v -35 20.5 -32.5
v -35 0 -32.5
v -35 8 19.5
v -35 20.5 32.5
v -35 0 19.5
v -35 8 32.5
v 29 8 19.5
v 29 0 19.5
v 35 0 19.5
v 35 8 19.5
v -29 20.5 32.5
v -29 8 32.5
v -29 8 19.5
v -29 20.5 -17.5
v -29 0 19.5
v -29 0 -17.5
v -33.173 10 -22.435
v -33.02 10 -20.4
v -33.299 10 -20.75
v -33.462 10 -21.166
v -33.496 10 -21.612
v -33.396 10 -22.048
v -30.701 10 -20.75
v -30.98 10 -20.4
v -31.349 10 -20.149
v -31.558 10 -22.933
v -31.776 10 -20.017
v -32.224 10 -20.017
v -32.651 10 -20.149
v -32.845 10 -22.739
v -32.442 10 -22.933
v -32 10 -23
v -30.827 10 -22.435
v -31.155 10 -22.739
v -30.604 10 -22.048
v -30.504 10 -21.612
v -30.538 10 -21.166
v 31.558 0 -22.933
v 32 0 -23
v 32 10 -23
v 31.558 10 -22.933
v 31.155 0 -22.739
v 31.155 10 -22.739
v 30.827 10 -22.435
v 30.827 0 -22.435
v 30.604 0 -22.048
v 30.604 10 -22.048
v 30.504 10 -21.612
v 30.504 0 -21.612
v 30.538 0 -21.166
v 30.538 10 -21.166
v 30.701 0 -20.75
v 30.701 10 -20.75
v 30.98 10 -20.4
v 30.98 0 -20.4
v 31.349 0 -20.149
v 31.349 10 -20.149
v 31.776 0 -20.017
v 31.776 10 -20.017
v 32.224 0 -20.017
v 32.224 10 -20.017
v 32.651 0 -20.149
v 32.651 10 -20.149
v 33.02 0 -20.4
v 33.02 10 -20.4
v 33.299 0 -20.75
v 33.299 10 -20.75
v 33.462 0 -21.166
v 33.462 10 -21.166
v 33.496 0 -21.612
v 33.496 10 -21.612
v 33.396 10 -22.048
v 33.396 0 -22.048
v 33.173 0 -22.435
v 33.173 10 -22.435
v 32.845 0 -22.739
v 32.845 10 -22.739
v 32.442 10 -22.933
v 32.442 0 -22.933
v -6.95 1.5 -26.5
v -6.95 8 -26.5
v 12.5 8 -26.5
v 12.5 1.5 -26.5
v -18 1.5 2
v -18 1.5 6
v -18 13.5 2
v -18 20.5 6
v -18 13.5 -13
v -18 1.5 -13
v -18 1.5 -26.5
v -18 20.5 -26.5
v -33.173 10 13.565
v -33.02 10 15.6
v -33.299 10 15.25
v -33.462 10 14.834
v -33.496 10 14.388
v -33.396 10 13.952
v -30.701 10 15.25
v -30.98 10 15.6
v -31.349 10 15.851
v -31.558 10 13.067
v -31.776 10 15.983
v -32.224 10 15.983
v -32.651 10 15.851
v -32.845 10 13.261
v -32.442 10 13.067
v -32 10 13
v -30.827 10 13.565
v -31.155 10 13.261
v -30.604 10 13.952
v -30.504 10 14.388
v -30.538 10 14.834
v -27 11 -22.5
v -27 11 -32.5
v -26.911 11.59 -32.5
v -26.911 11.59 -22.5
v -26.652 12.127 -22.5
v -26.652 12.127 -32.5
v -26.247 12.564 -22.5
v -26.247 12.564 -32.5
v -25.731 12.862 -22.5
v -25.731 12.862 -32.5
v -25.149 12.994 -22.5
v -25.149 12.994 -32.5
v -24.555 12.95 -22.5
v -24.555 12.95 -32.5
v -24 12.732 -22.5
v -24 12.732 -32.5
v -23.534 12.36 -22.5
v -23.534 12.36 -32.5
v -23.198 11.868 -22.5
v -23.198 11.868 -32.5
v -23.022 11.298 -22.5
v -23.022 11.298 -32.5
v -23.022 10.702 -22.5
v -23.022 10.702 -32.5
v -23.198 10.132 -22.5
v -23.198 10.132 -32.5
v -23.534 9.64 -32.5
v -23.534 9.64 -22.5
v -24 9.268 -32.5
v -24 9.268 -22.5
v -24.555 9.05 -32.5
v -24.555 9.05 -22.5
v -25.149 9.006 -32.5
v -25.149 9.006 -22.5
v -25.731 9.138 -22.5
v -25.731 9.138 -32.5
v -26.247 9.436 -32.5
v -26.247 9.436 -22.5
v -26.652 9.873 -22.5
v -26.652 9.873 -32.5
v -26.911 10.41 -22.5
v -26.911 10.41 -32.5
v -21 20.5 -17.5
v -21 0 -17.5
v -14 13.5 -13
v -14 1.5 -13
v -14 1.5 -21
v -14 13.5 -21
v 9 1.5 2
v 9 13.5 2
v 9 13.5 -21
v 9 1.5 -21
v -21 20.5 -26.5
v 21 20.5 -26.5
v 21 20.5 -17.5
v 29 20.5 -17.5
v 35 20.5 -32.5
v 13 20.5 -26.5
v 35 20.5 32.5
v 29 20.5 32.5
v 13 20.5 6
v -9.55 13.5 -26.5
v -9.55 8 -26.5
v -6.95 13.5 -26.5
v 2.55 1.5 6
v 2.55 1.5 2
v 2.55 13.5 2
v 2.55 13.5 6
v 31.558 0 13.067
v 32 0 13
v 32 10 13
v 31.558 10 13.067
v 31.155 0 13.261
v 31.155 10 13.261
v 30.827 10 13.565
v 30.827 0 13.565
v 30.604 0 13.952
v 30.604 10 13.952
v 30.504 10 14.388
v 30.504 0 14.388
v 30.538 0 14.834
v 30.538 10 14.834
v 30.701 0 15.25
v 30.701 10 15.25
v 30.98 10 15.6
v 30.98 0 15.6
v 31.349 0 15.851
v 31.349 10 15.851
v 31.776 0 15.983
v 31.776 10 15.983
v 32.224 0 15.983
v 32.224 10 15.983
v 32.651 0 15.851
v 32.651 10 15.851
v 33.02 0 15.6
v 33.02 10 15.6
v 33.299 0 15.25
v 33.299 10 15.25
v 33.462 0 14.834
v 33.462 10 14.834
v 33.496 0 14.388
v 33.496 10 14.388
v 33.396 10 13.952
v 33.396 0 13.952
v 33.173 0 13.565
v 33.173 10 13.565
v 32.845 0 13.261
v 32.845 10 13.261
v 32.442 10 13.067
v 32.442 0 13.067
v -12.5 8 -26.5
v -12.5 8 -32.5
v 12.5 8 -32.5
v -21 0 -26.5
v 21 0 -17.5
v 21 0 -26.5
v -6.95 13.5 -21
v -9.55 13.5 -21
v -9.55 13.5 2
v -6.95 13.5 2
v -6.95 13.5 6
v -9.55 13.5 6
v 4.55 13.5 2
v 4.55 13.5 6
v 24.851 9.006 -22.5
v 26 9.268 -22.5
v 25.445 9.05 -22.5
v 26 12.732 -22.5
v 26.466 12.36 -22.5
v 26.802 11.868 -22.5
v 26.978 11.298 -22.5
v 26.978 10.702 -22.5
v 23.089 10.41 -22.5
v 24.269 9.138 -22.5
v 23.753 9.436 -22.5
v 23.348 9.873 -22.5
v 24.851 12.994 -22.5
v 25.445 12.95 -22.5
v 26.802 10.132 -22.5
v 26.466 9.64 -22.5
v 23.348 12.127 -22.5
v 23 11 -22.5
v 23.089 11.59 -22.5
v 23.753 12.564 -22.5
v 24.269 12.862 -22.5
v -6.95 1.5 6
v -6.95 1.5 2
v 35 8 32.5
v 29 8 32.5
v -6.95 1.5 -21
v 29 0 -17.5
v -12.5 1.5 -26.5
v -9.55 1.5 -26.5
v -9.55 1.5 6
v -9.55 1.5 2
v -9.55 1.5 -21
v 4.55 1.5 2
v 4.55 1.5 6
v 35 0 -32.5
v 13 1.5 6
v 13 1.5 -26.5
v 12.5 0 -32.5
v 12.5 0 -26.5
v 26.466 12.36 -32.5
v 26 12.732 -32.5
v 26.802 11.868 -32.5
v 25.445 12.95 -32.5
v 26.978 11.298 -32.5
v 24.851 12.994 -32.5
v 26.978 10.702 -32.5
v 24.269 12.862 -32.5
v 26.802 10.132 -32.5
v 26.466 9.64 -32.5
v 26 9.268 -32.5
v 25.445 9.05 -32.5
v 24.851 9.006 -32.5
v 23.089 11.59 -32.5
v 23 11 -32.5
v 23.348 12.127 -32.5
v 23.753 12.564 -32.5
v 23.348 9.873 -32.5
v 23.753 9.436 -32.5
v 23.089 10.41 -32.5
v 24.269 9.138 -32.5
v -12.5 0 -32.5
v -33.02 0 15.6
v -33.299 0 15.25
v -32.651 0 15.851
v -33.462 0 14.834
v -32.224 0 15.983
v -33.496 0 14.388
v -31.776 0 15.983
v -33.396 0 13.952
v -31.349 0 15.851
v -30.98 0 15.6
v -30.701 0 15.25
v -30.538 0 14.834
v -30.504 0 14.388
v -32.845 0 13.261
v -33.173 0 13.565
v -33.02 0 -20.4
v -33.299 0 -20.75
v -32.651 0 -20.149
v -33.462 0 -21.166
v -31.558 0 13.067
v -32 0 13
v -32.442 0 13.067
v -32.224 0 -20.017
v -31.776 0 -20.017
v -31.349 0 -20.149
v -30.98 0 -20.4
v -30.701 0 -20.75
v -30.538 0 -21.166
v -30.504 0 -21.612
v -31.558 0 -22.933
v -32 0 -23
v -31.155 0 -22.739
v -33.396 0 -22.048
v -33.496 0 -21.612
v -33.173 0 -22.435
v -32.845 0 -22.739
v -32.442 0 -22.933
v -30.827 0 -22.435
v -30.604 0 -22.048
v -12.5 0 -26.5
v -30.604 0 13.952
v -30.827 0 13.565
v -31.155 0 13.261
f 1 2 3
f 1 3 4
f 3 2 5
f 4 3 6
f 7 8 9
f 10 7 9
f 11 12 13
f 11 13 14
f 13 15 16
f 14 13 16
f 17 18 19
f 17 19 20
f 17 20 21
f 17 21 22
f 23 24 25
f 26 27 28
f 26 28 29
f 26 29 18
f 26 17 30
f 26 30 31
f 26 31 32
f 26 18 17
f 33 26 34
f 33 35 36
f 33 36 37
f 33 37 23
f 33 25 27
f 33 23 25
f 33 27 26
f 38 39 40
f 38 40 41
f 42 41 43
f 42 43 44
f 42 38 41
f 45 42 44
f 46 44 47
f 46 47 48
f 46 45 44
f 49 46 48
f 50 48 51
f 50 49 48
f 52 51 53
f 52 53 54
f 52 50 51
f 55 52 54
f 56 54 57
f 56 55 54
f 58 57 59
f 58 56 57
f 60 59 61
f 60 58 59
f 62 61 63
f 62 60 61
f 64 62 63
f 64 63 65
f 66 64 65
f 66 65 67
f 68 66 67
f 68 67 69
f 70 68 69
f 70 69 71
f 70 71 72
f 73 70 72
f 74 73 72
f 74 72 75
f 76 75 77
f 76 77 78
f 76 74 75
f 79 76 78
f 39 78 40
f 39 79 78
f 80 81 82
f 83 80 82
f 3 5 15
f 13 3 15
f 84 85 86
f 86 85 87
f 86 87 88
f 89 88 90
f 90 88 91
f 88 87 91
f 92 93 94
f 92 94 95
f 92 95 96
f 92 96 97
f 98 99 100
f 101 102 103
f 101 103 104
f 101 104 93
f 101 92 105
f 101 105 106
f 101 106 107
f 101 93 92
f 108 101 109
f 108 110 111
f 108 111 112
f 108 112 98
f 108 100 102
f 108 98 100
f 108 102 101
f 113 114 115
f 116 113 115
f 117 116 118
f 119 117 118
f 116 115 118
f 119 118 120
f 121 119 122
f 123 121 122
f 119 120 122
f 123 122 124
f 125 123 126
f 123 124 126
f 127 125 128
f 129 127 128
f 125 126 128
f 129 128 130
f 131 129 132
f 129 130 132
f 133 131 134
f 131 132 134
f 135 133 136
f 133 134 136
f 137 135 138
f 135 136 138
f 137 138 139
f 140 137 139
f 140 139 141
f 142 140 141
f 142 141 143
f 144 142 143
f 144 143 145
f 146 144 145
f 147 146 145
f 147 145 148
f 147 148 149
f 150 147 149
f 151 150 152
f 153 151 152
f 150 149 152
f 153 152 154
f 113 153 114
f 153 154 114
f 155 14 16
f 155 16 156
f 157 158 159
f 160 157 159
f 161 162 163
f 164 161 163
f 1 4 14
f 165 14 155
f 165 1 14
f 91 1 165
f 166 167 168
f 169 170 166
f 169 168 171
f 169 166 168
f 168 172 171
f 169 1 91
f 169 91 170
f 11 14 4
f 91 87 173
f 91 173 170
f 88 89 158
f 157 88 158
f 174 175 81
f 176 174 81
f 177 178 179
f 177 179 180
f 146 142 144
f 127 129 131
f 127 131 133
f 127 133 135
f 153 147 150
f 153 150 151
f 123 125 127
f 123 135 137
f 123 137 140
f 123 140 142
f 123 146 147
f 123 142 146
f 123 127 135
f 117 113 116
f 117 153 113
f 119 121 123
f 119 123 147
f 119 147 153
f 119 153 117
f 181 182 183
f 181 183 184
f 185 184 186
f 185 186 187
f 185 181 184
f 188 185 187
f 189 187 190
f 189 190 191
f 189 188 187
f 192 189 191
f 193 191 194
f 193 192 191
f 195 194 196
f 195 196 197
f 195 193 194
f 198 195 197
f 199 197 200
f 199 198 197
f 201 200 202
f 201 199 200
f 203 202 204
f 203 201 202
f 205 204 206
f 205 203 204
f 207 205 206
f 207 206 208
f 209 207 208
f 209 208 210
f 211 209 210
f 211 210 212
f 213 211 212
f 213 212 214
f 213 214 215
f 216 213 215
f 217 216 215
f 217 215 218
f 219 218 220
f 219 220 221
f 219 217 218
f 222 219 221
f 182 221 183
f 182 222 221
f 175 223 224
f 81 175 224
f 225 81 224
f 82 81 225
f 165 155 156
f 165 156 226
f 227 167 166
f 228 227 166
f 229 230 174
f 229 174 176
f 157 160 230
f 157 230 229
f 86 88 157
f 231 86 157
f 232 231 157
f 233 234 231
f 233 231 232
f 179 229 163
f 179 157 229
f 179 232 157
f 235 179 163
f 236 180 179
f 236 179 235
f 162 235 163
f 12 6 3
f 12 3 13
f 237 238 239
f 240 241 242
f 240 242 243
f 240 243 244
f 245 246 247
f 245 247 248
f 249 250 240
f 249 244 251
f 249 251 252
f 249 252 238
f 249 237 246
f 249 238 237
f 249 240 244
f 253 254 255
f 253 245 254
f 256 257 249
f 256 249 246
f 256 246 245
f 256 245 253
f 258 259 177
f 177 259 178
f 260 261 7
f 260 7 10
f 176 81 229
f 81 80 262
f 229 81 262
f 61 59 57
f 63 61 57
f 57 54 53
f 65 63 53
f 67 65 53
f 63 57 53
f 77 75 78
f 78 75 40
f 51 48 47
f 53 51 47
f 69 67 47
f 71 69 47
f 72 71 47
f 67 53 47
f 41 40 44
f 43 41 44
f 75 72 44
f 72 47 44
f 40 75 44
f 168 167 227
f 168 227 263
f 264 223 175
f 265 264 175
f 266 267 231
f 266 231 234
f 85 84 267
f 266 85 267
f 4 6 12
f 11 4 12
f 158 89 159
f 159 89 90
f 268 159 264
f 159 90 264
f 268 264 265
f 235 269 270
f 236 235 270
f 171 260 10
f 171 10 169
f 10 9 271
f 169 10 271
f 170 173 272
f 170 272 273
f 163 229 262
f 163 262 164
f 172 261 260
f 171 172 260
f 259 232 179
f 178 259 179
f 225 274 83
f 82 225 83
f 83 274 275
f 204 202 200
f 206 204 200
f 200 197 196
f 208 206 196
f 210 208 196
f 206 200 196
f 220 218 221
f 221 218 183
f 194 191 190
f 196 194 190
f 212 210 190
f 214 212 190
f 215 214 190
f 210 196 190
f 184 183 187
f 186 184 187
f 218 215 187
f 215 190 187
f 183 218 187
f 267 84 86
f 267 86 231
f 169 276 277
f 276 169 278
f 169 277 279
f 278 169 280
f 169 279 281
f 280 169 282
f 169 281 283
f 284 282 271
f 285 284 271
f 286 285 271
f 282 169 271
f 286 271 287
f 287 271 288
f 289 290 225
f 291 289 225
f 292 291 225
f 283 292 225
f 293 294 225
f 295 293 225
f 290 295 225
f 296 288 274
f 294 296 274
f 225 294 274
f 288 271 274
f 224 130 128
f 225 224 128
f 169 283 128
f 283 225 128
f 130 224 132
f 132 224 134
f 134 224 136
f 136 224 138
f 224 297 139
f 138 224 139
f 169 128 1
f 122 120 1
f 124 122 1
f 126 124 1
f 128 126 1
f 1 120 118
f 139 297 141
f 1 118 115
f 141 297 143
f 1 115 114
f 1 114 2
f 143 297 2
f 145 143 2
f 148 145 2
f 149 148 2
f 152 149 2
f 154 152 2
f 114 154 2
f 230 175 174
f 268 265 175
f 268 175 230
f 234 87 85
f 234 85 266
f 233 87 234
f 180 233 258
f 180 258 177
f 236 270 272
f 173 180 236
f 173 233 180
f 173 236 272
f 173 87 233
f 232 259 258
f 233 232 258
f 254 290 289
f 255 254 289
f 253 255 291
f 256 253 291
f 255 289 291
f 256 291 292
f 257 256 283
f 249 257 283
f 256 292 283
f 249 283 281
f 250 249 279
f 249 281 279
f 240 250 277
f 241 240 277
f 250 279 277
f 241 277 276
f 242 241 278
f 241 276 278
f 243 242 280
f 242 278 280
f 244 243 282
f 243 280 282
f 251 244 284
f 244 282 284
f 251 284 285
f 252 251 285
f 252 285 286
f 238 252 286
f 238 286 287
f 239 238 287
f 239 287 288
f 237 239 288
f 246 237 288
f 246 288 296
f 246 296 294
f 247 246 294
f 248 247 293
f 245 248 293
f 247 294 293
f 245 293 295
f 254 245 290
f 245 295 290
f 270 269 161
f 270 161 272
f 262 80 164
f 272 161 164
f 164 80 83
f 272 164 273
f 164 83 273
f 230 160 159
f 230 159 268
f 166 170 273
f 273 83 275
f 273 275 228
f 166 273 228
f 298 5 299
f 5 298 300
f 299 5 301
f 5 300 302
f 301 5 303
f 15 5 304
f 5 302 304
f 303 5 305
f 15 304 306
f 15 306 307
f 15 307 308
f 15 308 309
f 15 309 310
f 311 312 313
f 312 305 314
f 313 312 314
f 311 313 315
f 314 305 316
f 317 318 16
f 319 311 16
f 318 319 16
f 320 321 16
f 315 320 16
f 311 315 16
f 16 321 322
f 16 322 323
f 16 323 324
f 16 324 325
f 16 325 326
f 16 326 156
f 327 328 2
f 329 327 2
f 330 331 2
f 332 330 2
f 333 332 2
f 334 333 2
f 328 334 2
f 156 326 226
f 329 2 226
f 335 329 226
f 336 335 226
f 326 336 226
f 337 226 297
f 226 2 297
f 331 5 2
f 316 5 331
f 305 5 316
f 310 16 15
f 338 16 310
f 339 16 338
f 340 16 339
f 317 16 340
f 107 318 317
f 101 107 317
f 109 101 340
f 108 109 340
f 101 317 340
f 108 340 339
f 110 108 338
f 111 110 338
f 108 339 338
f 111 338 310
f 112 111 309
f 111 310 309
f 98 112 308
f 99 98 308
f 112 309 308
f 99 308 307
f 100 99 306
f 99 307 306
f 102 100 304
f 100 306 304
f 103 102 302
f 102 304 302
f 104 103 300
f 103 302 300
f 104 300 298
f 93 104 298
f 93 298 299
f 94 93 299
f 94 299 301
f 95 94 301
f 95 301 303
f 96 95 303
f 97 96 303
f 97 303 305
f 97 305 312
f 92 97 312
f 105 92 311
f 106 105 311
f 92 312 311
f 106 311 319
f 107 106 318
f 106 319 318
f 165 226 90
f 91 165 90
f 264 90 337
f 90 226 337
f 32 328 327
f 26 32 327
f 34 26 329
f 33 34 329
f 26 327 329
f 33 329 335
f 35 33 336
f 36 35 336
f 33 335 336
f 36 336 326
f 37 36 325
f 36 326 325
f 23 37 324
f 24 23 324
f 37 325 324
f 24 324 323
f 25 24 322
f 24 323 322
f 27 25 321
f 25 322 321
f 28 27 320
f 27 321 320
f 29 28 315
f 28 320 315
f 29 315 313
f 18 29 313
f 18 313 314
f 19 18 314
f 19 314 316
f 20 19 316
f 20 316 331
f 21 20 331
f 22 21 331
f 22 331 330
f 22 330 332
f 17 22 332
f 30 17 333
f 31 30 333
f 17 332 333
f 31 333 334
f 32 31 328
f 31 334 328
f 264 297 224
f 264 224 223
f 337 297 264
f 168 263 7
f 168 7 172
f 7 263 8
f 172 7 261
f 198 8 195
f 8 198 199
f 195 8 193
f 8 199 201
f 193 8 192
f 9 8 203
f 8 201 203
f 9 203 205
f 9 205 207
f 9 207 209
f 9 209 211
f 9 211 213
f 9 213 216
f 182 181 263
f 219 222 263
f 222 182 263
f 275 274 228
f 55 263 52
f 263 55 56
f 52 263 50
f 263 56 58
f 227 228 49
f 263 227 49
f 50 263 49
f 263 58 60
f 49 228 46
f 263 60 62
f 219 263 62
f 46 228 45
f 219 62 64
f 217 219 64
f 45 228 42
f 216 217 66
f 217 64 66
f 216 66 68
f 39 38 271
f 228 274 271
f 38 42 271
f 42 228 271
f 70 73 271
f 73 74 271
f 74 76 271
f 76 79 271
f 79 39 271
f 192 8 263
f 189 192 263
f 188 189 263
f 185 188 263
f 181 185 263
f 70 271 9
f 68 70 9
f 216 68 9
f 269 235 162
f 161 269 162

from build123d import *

# Parameters (mm, degrees)
BOSS_EXTRUDE1_DEPTH = 20.5
SKETCH2_W           = 6
SKETCH2_H           = 13
SKETCH2_W_2         = 25
SKETCH2_H_2         = 6
CUT_EXTRUDE1_DEPTH  = 8
SKETCH3_W           = 23
SKETCH3_H           = 23
BOSS_EXTRUDE2_DEPTH = 7
SKETCH4_W           = 31
SKETCH4_H           = 32.5
SKETCH4_W_2         = 23
SKETCH4_H_2         = 23
BOSS_EXTRUDE4_DEPTH = 19
CUT_EXTRUDE2_REACH  = 53.403
SKETCH5_W           = 2.6
SKETCH5_H           = 5.5
SKETCH5_H_2         = 4
SKETCH5_W_2         = 4
SKETCH5_H_3         = 15
SKETCH5_W_3         = 2
SKETCH6_R           = 1.5
CUT_EXTRUDE3_DEPTH  = 10
SKETCH7_W           = 8
SKETCH7_H           = 9
BOSS_EXTRUDE5_DEPTH = 20.5
SKETCH8_R           = 2
CUT_EXTRUDE4_DEPTH  = 10


with BuildPart() as part:
    # Sketch1 → Boss-Extrude1 (new body)
    with BuildSketch(Plane(origin=(0, 0, 0), x_dir=(1, 0, 0), z_dir=(0, 1, 0))):
        Polygon((29, -32.5), (35, -32.5), (35, 32.5), (-35, 32.5), (-35, -32.5), (-29, -32.5), (-29, 26.5), (29, 26.5), align=None)
    extrude(amount=BOSS_EXTRUDE1_DEPTH)

    # Sketch2 → Cut-Extrude1 (cut)
    with BuildSketch(Plane.XZ):
        with Locations((32, 26)):
            Rectangle(SKETCH2_W, SKETCH2_H)
        with Locations((0, -29.5)):
            Rectangle(SKETCH2_W_2, SKETCH2_H_2)
        with Locations((-32, 26)):
            Rectangle(SKETCH2_W, SKETCH2_H)
    extrude(amount=-CUT_EXTRUDE1_DEPTH, mode=Mode.SUBTRACT)



with BuildPart() as body_2:
    # Sketch3 → Boss-Extrude2 (new body)
    with BuildSketch(Plane(origin=(0, 20.5, 0), x_dir=(1, 0, 0), z_dir=(0, 1, 0))):
        with Locations((-2.5, 9.5)):
            Rectangle(SKETCH3_W, SKETCH3_H)
    extrude(amount=-BOSS_EXTRUDE2_DEPTH)


with BuildPart() as part_1:
    add(part.part)

    add(body_2.part)  # Boss-Extrude4 merges body 2
    # Sketch4 → Boss-Extrude4 (add)
    with BuildSketch(Plane(origin=(0, 20.5, 0), x_dir=(1, 0, 0), z_dir=(0, 1, 0))):
        with Locations((-2.5, 10.25)):
            Rectangle(SKETCH4_W, SKETCH4_H)
        with Locations((-2.5, 9.5)):
            Rectangle(SKETCH4_W_2, SKETCH4_H_2, mode=Mode.SUBTRACT)
    extrude(amount=-BOSS_EXTRUDE4_DEPTH)

    # Cut-Extrude2: up to this face of the body (flat: up to its plane)
    cut_extrude2_end = Plane(part_1.part.faces().sort_by_distance((-2.5, 13.5, -9.5))[0])
    # Sketch5 → Cut-Extrude2 (cut, up to the picked face)
    with BuildSketch(Plane.XZ.offset(-1.5), mode=Mode.PRIVATE) as cut_extrude2_sk1:
        with Locations((-8.25, -23.75)):
            Rectangle(SKETCH5_W, SKETCH5_H)
    cut_extrude2_tool1 = split(extrude(cut_extrude2_sk1.sketch, amount=-CUT_EXTRUDE2_REACH, mode=Mode.PRIVATE), bisect_by=cut_extrude2_end, keep=Keep.BOTH, mode=Mode.PRIVATE)
    # Sketch5 → Cut-Extrude2 (cut, up to the picked face)
    with BuildSketch(Plane.XZ.offset(-1.5), mode=Mode.PRIVATE) as cut_extrude2_sk2:
        with Locations((-8.25, 4)):
            Rectangle(SKETCH5_W, SKETCH5_H_2)
    cut_extrude2_tool2 = split(extrude(cut_extrude2_sk2.sketch, amount=-CUT_EXTRUDE2_REACH, mode=Mode.PRIVATE), bisect_by=cut_extrude2_end, keep=Keep.BOTH, mode=Mode.PRIVATE)
    # Sketch5 → Cut-Extrude2 (cut, up to the picked face)
    with BuildSketch(Plane.XZ.offset(-1.5), mode=Mode.PRIVATE) as cut_extrude2_sk3:
        with Locations((-16, -5.5)):
            Rectangle(SKETCH5_W_2, SKETCH5_H_3)
    cut_extrude2_tool3 = split(extrude(cut_extrude2_sk3.sketch, amount=-CUT_EXTRUDE2_REACH, mode=Mode.PRIVATE), bisect_by=cut_extrude2_end, keep=Keep.BOTH, mode=Mode.PRIVATE)
    # Sketch5 → Cut-Extrude2 (cut, up to the picked face)
    with BuildSketch(Plane.XZ.offset(-1.5), mode=Mode.PRIVATE) as cut_extrude2_sk4:
        with Locations((3.55, 4)):
            Rectangle(SKETCH5_W_3, SKETCH5_H_2)
    cut_extrude2_tool4 = split(extrude(cut_extrude2_sk4.sketch, amount=-CUT_EXTRUDE2_REACH, mode=Mode.PRIVATE), bisect_by=cut_extrude2_end, keep=Keep.BOTH, mode=Mode.PRIVATE)
    add(cut_extrude2_tool1.solids().sort_by(Axis((-8.25, 1.5, -23.75), (0, 1, 0)))[0], mode=Mode.SUBTRACT)
    add(cut_extrude2_tool2.solids().sort_by(Axis((-8.25, 1.5, 4), (0, 1, 0)))[0], mode=Mode.SUBTRACT)
    add(cut_extrude2_tool3.solids().sort_by(Axis((-16, 1.5, -5.5), (0, 1, 0)))[0], mode=Mode.SUBTRACT)
    add(cut_extrude2_tool4.solids().sort_by(Axis((3.55, 1.5, 4), (0, 1, 0)))[0], mode=Mode.SUBTRACT)

    # Sketch6 → Cut-Extrude3 (cut)
    with BuildSketch(Plane.XZ):
        with Locations(Location((-32, 14.5, 0), (0, 0, 270))):
            Circle(SKETCH6_R)
        with Locations(Location((-32, -21.5, 0), (0, 0, 270))):
            Circle(SKETCH6_R)
    cut_extrude3 = extrude(amount=-CUT_EXTRUDE3_DEPTH, mode=Mode.SUBTRACT)

    # Mirror1: Cut-Extrude3 across plane
    add(cut_extrude3.mirror(Plane(origin=(0, 0, 0), x_dir=(0, 0, 1), z_dir=(1, 0, 0))), mode=Mode.SUBTRACT)

    # Sketch7 → Boss-Extrude5 (add)
    with BuildSketch(Plane(origin=(0, 20.5, 0), x_dir=(1, 0, 0), z_dir=(0, 1, 0))):
        with Locations((25, 22)):
            Rectangle(SKETCH7_W, SKETCH7_H)
        with Locations((-25, 22)):
            Rectangle(SKETCH7_W, SKETCH7_H)
    extrude(amount=-BOSS_EXTRUDE5_DEPTH)

    # Sketch8 → Cut-Extrude4 (cut)
    with BuildSketch(Plane(origin=(0, 0, -32.5), x_dir=(-1, 0, 0), z_dir=(0, 0, -1))):
        with Locations((-25, 11)):
            Circle(SKETCH8_R)
        with Locations((25, 11)):
            Circle(SKETCH8_R)
    extrude(amount=-CUT_EXTRUDE4_DEPTH, mode=Mode.SUBTRACT)


solid = part_1.part
